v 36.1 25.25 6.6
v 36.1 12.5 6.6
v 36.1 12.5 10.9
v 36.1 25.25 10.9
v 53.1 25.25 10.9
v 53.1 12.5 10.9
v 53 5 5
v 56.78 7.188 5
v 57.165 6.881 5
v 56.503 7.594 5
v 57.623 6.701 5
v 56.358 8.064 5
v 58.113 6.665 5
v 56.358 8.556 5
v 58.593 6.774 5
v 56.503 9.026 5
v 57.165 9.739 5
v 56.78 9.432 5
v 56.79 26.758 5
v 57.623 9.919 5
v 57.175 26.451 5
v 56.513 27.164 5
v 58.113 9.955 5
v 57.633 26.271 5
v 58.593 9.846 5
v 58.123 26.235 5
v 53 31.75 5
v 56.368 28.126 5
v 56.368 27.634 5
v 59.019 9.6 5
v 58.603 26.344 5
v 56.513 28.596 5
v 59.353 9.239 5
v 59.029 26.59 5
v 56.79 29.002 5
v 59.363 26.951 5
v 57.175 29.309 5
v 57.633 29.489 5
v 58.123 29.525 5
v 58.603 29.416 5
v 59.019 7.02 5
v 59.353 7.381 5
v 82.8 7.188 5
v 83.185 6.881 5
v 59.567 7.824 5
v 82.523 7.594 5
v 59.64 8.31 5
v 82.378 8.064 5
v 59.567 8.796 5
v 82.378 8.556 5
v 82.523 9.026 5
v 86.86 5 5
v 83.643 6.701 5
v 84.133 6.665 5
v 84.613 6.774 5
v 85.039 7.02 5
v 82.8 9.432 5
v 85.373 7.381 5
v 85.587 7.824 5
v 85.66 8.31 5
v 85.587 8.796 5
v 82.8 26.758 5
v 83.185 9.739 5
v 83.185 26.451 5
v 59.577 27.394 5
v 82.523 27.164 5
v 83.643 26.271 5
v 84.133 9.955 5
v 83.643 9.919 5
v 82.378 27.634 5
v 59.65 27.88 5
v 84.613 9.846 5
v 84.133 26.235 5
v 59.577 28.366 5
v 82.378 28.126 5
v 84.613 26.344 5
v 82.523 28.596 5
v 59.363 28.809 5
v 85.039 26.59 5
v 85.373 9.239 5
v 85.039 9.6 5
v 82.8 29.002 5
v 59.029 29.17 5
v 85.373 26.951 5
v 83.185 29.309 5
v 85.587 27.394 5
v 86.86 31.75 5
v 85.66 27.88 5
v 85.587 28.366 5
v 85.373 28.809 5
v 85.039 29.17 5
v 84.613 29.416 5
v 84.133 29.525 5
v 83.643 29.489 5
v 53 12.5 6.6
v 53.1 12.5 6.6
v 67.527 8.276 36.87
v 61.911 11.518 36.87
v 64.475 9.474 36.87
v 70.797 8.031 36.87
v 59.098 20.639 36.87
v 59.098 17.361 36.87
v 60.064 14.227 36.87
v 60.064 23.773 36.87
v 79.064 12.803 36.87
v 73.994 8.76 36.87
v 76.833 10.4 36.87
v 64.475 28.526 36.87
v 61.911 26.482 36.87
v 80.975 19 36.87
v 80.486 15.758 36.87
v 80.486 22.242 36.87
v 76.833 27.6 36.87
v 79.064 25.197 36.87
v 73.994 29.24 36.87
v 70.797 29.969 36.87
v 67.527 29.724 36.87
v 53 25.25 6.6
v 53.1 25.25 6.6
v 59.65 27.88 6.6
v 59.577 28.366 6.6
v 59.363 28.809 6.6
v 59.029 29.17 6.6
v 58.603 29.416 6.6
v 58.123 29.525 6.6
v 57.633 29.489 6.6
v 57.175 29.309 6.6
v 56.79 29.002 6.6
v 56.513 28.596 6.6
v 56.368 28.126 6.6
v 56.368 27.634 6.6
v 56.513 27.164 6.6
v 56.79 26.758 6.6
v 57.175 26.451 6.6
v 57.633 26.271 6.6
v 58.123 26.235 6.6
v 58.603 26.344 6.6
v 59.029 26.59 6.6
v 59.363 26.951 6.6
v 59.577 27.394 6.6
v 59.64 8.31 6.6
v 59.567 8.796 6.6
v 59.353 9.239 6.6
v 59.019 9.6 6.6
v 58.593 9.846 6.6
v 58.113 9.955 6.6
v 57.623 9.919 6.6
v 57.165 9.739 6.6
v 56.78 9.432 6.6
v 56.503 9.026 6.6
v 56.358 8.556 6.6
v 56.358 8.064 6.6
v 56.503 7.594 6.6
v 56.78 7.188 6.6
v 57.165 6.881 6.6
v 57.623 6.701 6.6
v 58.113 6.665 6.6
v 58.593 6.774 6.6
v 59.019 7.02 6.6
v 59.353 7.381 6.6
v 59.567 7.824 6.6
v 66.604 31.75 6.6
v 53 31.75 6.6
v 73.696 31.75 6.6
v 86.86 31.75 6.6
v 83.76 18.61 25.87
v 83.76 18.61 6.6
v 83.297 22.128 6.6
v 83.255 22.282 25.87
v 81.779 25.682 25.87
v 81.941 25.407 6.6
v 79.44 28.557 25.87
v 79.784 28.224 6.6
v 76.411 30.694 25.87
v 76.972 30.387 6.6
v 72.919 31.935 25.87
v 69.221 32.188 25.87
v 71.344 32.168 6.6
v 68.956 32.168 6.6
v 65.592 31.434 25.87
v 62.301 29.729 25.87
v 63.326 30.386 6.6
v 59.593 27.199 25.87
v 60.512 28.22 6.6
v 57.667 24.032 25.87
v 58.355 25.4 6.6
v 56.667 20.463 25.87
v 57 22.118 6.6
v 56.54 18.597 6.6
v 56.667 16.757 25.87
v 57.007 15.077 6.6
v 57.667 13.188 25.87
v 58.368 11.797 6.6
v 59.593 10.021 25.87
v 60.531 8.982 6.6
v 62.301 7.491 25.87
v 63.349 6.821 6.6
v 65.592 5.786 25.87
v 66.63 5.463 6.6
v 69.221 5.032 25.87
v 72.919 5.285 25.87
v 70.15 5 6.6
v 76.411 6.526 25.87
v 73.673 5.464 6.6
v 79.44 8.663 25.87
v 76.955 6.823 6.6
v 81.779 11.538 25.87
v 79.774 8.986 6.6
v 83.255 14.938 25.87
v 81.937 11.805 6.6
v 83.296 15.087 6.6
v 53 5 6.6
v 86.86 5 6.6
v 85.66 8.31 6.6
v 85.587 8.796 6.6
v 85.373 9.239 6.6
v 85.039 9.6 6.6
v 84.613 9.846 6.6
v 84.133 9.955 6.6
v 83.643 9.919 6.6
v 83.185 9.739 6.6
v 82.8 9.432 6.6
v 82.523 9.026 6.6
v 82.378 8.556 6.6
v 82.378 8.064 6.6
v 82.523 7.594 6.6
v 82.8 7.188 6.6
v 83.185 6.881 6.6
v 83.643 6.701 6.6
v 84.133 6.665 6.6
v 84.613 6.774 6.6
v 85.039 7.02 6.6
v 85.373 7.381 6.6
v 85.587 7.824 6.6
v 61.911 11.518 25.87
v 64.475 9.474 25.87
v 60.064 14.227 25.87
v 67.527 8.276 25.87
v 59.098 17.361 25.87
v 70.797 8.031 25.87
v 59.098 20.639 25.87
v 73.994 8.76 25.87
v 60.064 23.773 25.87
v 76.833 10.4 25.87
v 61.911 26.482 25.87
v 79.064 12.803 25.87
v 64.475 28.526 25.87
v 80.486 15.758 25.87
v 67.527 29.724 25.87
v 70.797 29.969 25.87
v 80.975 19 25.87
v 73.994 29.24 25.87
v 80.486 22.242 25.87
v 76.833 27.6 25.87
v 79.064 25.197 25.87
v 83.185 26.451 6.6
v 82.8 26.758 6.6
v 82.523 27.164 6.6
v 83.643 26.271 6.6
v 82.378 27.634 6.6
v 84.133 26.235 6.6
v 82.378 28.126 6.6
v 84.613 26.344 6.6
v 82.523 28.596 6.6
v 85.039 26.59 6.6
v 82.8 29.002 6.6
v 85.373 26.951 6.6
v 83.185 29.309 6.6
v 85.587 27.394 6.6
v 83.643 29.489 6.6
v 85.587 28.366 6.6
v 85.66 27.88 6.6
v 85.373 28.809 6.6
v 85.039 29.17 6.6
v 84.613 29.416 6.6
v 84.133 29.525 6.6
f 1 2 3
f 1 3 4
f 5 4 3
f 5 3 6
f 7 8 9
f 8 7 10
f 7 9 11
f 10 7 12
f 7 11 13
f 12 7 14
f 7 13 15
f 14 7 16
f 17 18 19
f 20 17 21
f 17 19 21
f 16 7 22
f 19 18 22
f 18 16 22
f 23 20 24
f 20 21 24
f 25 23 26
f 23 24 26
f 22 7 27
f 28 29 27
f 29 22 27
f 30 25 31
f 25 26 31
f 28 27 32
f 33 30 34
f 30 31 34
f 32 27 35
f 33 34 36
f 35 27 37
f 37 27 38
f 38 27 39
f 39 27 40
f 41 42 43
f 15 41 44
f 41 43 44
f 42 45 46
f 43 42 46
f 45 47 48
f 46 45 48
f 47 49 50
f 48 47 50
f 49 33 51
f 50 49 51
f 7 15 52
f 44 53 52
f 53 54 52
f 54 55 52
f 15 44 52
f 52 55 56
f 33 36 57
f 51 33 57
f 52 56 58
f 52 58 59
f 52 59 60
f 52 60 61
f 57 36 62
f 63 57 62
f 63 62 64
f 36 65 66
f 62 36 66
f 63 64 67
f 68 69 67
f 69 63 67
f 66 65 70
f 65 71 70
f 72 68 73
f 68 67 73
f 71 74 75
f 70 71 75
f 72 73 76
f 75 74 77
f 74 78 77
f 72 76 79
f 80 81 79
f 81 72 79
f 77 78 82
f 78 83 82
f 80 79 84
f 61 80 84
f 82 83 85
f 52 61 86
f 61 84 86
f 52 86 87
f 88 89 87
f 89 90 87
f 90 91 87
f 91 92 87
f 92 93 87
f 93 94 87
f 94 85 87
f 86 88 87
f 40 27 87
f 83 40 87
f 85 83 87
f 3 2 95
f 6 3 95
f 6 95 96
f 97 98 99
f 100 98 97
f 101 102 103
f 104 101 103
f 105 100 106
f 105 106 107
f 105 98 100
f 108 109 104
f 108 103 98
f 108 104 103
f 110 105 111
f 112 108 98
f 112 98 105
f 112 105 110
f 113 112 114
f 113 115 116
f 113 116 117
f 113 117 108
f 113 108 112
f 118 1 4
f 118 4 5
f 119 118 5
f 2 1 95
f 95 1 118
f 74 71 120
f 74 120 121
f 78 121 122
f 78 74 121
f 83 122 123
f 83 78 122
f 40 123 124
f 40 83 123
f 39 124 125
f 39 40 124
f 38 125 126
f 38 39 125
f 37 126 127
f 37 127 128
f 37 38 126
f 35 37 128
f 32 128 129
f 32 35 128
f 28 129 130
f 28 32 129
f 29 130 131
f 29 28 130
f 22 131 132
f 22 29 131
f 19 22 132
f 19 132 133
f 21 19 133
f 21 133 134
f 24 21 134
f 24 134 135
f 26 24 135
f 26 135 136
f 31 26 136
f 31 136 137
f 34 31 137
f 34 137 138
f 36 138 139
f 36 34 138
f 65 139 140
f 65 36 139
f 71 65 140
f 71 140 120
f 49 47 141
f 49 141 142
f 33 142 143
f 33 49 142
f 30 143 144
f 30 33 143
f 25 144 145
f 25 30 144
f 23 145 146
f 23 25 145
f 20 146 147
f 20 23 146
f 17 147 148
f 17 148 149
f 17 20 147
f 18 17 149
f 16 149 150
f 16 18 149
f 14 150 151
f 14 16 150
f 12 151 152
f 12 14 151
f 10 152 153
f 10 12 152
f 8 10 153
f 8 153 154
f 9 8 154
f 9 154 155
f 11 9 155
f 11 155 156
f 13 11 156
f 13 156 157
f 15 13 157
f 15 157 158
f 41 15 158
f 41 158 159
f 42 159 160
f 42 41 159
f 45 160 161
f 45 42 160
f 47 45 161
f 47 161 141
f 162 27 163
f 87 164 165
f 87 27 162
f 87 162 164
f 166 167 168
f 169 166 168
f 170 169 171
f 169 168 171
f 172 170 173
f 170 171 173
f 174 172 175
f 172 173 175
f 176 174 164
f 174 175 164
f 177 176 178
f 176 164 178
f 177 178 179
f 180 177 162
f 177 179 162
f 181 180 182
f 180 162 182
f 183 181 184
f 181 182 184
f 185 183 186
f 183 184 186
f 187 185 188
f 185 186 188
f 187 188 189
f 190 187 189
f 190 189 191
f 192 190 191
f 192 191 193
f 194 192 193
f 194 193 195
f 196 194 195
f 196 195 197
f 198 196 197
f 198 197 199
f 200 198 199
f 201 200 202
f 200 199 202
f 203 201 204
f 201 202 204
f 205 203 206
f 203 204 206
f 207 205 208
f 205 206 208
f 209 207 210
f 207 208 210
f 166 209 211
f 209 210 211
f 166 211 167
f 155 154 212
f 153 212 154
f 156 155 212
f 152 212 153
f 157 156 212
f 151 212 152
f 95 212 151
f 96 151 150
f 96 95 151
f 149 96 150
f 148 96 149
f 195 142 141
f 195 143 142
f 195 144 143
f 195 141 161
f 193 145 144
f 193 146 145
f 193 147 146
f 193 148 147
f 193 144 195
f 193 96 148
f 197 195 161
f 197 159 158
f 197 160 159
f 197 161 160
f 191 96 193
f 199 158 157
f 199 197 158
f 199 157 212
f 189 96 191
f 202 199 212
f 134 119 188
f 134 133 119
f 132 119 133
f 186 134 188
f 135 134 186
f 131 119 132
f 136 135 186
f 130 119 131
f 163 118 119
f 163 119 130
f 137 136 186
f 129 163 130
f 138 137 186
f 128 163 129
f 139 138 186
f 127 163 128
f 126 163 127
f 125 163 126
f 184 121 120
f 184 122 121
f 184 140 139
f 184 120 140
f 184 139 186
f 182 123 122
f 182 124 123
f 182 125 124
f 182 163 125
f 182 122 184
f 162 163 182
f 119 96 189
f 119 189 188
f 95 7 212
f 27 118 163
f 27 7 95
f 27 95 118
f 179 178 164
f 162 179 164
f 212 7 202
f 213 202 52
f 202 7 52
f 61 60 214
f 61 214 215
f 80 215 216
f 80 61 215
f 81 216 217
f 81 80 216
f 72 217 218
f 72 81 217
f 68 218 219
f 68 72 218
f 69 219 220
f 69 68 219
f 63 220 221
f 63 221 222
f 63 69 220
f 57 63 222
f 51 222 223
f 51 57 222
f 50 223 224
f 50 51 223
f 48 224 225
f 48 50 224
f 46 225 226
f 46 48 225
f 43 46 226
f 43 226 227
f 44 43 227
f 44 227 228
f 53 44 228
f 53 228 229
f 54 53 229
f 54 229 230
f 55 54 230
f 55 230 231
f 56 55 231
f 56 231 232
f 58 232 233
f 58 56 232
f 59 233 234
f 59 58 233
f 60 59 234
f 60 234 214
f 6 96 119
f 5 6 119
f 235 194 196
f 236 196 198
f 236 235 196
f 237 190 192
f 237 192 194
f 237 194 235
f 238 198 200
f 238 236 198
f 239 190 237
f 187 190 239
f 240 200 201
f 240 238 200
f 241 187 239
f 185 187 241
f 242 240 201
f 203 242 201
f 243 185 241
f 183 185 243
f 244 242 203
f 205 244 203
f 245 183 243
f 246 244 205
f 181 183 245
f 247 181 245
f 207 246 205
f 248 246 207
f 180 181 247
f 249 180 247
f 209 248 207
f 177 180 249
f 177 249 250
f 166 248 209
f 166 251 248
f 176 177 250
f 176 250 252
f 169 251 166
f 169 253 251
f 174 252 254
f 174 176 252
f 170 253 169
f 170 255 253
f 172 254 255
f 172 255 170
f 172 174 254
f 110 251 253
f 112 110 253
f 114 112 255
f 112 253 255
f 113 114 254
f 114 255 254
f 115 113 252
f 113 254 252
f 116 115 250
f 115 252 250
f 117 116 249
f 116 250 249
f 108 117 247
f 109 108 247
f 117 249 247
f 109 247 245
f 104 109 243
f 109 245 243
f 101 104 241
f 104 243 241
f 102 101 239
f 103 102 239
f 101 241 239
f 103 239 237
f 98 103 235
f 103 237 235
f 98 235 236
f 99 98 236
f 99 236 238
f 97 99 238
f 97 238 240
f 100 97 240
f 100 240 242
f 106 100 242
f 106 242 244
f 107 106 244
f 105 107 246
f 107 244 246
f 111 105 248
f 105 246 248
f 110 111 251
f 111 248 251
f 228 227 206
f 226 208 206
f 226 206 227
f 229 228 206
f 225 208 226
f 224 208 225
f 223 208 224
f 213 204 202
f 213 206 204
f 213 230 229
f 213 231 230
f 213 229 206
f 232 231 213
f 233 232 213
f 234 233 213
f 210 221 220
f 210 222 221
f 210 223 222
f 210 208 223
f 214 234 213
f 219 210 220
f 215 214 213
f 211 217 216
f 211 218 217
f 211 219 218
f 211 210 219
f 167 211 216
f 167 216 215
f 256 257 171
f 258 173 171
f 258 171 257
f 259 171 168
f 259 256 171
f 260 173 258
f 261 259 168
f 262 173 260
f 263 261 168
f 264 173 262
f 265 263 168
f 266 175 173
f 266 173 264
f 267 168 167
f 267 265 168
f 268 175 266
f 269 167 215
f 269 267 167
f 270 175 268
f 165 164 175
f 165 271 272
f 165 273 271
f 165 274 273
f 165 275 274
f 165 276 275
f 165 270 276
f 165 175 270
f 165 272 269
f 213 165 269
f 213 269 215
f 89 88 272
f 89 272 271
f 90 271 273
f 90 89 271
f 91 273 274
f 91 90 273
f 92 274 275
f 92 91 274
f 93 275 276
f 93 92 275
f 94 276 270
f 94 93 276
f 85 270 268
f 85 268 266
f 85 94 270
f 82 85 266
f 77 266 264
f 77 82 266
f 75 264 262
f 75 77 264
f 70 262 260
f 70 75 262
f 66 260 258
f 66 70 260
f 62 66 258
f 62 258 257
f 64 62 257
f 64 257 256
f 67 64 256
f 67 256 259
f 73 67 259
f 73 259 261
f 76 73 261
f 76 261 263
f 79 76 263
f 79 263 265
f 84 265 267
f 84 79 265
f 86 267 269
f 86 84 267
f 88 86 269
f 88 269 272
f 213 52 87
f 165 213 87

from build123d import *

# Parameters (mm, degrees)
SKETCH018_R      = 11
EXTRUDE016_DEPTH = 11
SKETCH015_W      = 33.86
SKETCH015_H      = 26.75
SKETCH015_R      = 1.65
EXTRUDE017_DEPTH = 1.6
SKETCH016_W      = 17
SKETCH016_H      = 12.75
EXTRUDE018_DEPTH = 4.3
SKETCH017_R      = 13.61
EXTRUDE015_DEPTH = 19.27


with BuildPart() as extrude_joystick_stick:
    # Sketch018 → Extrude016 (new body)
    with BuildSketch(Plane.XY):
        with Locations((16.975, 14)):
            Circle(SKETCH018_R)
    extrude(amount=EXTRUDE016_DEPTH)


with BuildPart() as extrude_joystick_stick_1:
    # Extrude016 placement: moved
    add(extrude_joystick_stick.part.moved(Location((0, 0, 20.87))))


with BuildPart() as extrude_joystick_base:
    # Sketch015 → Extrude017 (new body)
    with BuildSketch(Plane.XY):
        with Locations((16.93, 13.375)):
            Rectangle(SKETCH015_W, SKETCH015_H)
        with Locations((5, 22.88)):
            Circle(SKETCH015_R, mode=Mode.SUBTRACT)
        with Locations((31.01, 22.88)):
            Circle(SKETCH015_R, mode=Mode.SUBTRACT)
        with Locations((4.99, 3.31)):
            Circle(SKETCH015_R, mode=Mode.SUBTRACT)
        with Locations((31.01, 3.31)):
            Circle(SKETCH015_R, mode=Mode.SUBTRACT)
    extrude(amount=EXTRUDE017_DEPTH)


with BuildPart() as extrude_joystick_connector:
    # Sketch016 → Extrude018 (new body)
    with BuildSketch(Plane.XY):
        with Locations((-8.5, 13.875)):
            Rectangle(SKETCH016_W, SKETCH016_H)
    extrude(amount=EXTRUDE018_DEPTH)


with BuildPart() as extrude_joystick_connector_1:
    # Extrude018 placement: moved
    add(extrude_joystick_connector.part.moved(Location((0.1, 0, 1.6))))


with BuildPart() as fusion_joystick_connector:
    # Sketch017 → Extrude015 (new body)
    with BuildSketch(Plane.XY):
        with Locations((17.15, 13.61)):
            Circle(SKETCH017_R)
    extrude(amount=EXTRUDE015_DEPTH)


with BuildPart() as fusion_joystick_connector_1:
    # Extrude015 placement: moved
    add(fusion_joystick_connector.part.moved(Location((0, 0, 1.6))))

    # Fusion005: union Extrude_JoyStick_Stick, Extrude_JoyStick_base, Extrude_JoyStick_connector
    add(extrude_joystick_stick_1.part)
    add(extrude_joystick_base.part)
    add(extrude_joystick_connector_1.part)


with BuildPart() as fusion_joystick_connector_2:
    # Fusion005 placement: moved
    add(fusion_joystick_connector_1.part.moved(Location((53, 5, 5))))


solid = fusion_joystick_connector_2.part
